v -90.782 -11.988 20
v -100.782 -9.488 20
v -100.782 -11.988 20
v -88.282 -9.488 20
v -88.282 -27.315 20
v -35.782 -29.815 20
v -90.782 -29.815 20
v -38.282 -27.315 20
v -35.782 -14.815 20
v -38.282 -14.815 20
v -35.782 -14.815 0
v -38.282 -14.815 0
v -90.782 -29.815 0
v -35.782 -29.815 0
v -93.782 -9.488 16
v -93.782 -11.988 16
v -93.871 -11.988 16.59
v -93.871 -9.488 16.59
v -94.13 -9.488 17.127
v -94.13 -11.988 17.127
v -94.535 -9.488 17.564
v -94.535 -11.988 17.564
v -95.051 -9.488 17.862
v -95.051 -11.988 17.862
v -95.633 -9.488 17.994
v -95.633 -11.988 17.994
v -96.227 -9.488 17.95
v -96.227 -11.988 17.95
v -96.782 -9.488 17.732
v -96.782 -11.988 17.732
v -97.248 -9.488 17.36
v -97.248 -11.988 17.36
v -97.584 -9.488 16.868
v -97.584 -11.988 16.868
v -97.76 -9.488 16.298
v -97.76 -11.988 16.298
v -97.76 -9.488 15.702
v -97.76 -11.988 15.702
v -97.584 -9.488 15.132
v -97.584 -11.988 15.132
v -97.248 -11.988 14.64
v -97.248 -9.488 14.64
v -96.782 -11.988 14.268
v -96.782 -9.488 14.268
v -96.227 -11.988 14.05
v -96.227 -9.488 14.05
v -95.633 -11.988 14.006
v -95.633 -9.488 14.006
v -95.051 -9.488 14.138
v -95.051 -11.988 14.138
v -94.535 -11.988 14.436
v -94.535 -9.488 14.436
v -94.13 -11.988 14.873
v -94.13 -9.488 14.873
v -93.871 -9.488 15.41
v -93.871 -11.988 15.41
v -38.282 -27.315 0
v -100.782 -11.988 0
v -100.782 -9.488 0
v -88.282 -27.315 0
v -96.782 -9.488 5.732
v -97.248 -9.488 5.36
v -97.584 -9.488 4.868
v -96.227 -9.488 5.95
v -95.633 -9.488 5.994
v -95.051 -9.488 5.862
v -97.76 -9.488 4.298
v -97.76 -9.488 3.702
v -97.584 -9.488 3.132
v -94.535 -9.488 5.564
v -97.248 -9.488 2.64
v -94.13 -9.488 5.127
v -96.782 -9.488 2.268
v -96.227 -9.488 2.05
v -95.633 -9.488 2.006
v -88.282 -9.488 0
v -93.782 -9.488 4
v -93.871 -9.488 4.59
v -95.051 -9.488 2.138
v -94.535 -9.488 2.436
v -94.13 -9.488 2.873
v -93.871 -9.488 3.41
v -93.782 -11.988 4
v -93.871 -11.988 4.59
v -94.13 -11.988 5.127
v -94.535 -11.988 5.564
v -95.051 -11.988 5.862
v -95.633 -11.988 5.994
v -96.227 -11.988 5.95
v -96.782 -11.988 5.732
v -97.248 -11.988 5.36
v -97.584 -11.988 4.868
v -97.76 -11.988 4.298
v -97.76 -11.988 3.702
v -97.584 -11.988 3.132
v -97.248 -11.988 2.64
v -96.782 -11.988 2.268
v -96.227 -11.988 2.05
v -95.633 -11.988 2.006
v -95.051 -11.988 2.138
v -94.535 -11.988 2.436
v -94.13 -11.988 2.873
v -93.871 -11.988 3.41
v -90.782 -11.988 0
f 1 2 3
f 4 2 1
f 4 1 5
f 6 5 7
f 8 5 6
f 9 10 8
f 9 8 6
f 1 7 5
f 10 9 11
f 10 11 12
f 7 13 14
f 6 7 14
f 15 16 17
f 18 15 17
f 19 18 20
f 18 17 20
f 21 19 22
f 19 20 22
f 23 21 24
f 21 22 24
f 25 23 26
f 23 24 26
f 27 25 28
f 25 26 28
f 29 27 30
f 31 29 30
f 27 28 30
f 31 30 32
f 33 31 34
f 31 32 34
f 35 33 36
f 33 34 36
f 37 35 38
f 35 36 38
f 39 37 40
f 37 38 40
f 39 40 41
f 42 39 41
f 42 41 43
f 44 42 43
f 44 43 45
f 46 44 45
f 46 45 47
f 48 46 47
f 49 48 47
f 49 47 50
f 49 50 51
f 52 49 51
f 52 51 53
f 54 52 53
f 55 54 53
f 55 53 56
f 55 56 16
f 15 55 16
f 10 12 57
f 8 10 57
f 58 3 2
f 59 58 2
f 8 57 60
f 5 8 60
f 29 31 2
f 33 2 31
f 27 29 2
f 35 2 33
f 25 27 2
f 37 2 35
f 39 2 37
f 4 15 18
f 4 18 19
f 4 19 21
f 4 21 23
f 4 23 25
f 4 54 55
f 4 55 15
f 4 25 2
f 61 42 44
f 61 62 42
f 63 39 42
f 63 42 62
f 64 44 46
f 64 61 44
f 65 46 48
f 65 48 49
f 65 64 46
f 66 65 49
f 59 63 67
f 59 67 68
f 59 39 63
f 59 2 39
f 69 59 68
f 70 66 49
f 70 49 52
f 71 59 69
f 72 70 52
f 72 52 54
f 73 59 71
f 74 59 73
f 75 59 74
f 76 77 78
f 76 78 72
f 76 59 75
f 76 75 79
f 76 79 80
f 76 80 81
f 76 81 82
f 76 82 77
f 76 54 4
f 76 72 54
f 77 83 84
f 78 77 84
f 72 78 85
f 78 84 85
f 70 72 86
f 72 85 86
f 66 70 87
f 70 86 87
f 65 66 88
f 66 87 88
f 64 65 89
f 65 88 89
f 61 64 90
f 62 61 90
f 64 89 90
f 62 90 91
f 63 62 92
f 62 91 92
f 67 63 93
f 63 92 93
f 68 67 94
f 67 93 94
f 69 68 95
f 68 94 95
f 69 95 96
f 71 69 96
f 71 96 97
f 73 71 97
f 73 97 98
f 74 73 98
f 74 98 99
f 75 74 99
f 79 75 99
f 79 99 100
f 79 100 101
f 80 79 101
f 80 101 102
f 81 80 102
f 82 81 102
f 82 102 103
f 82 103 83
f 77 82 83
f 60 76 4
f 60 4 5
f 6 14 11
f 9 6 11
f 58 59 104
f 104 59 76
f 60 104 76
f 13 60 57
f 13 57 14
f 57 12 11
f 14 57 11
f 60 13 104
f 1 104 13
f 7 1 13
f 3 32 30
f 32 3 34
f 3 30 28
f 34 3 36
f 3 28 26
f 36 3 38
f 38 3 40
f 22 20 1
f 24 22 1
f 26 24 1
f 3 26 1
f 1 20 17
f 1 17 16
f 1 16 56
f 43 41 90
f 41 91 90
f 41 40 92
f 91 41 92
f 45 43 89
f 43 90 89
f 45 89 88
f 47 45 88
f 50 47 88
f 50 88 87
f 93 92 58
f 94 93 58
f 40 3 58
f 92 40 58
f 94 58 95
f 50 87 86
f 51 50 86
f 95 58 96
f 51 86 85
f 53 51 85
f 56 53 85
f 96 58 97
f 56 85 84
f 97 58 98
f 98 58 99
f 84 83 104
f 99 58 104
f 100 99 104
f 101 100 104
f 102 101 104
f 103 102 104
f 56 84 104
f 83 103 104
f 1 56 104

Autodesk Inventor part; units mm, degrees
ref_plane "YZ Plane" through (0, 0, 0) normal (1, 0, 0) x (0, 1, 0)
ref_plane "XZ Plane" through (0, 0, 0) normal (0, 1, 0) x (-1, 0, 0)
ref_plane "XY Plane" through (0, 0, 0) normal (0, 0, 1) x (1, 0, 0)
sketch "Sketch1" plane through (0, 0, 0) normal (0, 0, 1) x (1, 0, 0)
  line L0 (-100.782, -11.9876) -> (-90.782, -11.9876)
  line L1 (-100.782, -9.4876) -> (-88.282, -9.4876)
  line L2 (-90.782, -11.9876) -> (-90.782, -20.4134)
  line L3 (-88.282, -9.4876) -> (-88.282, -20.4134)
  line L4 (-90.782, -20.4134) -> (-90.782, -29.8154)
  line L5 (-90.782, -29.8154) -> (-35.782, -29.8154)
  line L6 (-35.782, -29.8154) -> (-35.782, -14.8154)
  line L7 (-38.282, -14.8154) -> (-38.282, -27.3154)
  line L8 (-38.282, -27.3154) -> (-88.282, -27.3154)
  line L9 (-88.282, -27.3154) -> (-88.282, -20.4134)
  line L10 (-100.782, -11.9876) -> (-100.782, -9.4876)
  line L11 (-35.782, -14.8154) -> (-38.282, -14.8154)
  dimension "d6" = 10
  dimension "d7" = 2.5
  dimension "d8" = 2.5
  dimension "d9" = 2.5
  dimension "d20" = 15
  dimension "d21" = 65
  dimension "d29" = 2.5
extrude "Extrusion1" add sketch "Sketch1" along normal blind 20
sketch "Sketch2" plane through (-100.782, -11.9876, 0) normal (0, -1, 0) x (1, 0, 0)
  line L0 (0, 0) -> (0, 20) projected
  line L1 (10, 0) -> (10, 20) projected
  line L2 (0, 20) -> (10, 20) projected
  line L3 (0, 0) -> (10, 0) projected
  circle A0 centre (5, 4) radius 2
  circle A1 centre (5, 16) radius 2
  line L4 (65, 0) -> (65, 20) projected
  point P0 (100.782, 0)
  dimension "d17" = 4
  dimension "d22" = 4
  dimension "d24" = 12
  dimension "d25" = 4
  dimension "d27" = 60
  dimension "d28" = 60
extrude "Extrusion2" cut sketch "Sketch2" against normal blind 4 contours A0 | A1
equation "\"d17\" = d22"
properties part number "Carcasa para Placa Reed Switch 40x20" material "ABS Plastic"
